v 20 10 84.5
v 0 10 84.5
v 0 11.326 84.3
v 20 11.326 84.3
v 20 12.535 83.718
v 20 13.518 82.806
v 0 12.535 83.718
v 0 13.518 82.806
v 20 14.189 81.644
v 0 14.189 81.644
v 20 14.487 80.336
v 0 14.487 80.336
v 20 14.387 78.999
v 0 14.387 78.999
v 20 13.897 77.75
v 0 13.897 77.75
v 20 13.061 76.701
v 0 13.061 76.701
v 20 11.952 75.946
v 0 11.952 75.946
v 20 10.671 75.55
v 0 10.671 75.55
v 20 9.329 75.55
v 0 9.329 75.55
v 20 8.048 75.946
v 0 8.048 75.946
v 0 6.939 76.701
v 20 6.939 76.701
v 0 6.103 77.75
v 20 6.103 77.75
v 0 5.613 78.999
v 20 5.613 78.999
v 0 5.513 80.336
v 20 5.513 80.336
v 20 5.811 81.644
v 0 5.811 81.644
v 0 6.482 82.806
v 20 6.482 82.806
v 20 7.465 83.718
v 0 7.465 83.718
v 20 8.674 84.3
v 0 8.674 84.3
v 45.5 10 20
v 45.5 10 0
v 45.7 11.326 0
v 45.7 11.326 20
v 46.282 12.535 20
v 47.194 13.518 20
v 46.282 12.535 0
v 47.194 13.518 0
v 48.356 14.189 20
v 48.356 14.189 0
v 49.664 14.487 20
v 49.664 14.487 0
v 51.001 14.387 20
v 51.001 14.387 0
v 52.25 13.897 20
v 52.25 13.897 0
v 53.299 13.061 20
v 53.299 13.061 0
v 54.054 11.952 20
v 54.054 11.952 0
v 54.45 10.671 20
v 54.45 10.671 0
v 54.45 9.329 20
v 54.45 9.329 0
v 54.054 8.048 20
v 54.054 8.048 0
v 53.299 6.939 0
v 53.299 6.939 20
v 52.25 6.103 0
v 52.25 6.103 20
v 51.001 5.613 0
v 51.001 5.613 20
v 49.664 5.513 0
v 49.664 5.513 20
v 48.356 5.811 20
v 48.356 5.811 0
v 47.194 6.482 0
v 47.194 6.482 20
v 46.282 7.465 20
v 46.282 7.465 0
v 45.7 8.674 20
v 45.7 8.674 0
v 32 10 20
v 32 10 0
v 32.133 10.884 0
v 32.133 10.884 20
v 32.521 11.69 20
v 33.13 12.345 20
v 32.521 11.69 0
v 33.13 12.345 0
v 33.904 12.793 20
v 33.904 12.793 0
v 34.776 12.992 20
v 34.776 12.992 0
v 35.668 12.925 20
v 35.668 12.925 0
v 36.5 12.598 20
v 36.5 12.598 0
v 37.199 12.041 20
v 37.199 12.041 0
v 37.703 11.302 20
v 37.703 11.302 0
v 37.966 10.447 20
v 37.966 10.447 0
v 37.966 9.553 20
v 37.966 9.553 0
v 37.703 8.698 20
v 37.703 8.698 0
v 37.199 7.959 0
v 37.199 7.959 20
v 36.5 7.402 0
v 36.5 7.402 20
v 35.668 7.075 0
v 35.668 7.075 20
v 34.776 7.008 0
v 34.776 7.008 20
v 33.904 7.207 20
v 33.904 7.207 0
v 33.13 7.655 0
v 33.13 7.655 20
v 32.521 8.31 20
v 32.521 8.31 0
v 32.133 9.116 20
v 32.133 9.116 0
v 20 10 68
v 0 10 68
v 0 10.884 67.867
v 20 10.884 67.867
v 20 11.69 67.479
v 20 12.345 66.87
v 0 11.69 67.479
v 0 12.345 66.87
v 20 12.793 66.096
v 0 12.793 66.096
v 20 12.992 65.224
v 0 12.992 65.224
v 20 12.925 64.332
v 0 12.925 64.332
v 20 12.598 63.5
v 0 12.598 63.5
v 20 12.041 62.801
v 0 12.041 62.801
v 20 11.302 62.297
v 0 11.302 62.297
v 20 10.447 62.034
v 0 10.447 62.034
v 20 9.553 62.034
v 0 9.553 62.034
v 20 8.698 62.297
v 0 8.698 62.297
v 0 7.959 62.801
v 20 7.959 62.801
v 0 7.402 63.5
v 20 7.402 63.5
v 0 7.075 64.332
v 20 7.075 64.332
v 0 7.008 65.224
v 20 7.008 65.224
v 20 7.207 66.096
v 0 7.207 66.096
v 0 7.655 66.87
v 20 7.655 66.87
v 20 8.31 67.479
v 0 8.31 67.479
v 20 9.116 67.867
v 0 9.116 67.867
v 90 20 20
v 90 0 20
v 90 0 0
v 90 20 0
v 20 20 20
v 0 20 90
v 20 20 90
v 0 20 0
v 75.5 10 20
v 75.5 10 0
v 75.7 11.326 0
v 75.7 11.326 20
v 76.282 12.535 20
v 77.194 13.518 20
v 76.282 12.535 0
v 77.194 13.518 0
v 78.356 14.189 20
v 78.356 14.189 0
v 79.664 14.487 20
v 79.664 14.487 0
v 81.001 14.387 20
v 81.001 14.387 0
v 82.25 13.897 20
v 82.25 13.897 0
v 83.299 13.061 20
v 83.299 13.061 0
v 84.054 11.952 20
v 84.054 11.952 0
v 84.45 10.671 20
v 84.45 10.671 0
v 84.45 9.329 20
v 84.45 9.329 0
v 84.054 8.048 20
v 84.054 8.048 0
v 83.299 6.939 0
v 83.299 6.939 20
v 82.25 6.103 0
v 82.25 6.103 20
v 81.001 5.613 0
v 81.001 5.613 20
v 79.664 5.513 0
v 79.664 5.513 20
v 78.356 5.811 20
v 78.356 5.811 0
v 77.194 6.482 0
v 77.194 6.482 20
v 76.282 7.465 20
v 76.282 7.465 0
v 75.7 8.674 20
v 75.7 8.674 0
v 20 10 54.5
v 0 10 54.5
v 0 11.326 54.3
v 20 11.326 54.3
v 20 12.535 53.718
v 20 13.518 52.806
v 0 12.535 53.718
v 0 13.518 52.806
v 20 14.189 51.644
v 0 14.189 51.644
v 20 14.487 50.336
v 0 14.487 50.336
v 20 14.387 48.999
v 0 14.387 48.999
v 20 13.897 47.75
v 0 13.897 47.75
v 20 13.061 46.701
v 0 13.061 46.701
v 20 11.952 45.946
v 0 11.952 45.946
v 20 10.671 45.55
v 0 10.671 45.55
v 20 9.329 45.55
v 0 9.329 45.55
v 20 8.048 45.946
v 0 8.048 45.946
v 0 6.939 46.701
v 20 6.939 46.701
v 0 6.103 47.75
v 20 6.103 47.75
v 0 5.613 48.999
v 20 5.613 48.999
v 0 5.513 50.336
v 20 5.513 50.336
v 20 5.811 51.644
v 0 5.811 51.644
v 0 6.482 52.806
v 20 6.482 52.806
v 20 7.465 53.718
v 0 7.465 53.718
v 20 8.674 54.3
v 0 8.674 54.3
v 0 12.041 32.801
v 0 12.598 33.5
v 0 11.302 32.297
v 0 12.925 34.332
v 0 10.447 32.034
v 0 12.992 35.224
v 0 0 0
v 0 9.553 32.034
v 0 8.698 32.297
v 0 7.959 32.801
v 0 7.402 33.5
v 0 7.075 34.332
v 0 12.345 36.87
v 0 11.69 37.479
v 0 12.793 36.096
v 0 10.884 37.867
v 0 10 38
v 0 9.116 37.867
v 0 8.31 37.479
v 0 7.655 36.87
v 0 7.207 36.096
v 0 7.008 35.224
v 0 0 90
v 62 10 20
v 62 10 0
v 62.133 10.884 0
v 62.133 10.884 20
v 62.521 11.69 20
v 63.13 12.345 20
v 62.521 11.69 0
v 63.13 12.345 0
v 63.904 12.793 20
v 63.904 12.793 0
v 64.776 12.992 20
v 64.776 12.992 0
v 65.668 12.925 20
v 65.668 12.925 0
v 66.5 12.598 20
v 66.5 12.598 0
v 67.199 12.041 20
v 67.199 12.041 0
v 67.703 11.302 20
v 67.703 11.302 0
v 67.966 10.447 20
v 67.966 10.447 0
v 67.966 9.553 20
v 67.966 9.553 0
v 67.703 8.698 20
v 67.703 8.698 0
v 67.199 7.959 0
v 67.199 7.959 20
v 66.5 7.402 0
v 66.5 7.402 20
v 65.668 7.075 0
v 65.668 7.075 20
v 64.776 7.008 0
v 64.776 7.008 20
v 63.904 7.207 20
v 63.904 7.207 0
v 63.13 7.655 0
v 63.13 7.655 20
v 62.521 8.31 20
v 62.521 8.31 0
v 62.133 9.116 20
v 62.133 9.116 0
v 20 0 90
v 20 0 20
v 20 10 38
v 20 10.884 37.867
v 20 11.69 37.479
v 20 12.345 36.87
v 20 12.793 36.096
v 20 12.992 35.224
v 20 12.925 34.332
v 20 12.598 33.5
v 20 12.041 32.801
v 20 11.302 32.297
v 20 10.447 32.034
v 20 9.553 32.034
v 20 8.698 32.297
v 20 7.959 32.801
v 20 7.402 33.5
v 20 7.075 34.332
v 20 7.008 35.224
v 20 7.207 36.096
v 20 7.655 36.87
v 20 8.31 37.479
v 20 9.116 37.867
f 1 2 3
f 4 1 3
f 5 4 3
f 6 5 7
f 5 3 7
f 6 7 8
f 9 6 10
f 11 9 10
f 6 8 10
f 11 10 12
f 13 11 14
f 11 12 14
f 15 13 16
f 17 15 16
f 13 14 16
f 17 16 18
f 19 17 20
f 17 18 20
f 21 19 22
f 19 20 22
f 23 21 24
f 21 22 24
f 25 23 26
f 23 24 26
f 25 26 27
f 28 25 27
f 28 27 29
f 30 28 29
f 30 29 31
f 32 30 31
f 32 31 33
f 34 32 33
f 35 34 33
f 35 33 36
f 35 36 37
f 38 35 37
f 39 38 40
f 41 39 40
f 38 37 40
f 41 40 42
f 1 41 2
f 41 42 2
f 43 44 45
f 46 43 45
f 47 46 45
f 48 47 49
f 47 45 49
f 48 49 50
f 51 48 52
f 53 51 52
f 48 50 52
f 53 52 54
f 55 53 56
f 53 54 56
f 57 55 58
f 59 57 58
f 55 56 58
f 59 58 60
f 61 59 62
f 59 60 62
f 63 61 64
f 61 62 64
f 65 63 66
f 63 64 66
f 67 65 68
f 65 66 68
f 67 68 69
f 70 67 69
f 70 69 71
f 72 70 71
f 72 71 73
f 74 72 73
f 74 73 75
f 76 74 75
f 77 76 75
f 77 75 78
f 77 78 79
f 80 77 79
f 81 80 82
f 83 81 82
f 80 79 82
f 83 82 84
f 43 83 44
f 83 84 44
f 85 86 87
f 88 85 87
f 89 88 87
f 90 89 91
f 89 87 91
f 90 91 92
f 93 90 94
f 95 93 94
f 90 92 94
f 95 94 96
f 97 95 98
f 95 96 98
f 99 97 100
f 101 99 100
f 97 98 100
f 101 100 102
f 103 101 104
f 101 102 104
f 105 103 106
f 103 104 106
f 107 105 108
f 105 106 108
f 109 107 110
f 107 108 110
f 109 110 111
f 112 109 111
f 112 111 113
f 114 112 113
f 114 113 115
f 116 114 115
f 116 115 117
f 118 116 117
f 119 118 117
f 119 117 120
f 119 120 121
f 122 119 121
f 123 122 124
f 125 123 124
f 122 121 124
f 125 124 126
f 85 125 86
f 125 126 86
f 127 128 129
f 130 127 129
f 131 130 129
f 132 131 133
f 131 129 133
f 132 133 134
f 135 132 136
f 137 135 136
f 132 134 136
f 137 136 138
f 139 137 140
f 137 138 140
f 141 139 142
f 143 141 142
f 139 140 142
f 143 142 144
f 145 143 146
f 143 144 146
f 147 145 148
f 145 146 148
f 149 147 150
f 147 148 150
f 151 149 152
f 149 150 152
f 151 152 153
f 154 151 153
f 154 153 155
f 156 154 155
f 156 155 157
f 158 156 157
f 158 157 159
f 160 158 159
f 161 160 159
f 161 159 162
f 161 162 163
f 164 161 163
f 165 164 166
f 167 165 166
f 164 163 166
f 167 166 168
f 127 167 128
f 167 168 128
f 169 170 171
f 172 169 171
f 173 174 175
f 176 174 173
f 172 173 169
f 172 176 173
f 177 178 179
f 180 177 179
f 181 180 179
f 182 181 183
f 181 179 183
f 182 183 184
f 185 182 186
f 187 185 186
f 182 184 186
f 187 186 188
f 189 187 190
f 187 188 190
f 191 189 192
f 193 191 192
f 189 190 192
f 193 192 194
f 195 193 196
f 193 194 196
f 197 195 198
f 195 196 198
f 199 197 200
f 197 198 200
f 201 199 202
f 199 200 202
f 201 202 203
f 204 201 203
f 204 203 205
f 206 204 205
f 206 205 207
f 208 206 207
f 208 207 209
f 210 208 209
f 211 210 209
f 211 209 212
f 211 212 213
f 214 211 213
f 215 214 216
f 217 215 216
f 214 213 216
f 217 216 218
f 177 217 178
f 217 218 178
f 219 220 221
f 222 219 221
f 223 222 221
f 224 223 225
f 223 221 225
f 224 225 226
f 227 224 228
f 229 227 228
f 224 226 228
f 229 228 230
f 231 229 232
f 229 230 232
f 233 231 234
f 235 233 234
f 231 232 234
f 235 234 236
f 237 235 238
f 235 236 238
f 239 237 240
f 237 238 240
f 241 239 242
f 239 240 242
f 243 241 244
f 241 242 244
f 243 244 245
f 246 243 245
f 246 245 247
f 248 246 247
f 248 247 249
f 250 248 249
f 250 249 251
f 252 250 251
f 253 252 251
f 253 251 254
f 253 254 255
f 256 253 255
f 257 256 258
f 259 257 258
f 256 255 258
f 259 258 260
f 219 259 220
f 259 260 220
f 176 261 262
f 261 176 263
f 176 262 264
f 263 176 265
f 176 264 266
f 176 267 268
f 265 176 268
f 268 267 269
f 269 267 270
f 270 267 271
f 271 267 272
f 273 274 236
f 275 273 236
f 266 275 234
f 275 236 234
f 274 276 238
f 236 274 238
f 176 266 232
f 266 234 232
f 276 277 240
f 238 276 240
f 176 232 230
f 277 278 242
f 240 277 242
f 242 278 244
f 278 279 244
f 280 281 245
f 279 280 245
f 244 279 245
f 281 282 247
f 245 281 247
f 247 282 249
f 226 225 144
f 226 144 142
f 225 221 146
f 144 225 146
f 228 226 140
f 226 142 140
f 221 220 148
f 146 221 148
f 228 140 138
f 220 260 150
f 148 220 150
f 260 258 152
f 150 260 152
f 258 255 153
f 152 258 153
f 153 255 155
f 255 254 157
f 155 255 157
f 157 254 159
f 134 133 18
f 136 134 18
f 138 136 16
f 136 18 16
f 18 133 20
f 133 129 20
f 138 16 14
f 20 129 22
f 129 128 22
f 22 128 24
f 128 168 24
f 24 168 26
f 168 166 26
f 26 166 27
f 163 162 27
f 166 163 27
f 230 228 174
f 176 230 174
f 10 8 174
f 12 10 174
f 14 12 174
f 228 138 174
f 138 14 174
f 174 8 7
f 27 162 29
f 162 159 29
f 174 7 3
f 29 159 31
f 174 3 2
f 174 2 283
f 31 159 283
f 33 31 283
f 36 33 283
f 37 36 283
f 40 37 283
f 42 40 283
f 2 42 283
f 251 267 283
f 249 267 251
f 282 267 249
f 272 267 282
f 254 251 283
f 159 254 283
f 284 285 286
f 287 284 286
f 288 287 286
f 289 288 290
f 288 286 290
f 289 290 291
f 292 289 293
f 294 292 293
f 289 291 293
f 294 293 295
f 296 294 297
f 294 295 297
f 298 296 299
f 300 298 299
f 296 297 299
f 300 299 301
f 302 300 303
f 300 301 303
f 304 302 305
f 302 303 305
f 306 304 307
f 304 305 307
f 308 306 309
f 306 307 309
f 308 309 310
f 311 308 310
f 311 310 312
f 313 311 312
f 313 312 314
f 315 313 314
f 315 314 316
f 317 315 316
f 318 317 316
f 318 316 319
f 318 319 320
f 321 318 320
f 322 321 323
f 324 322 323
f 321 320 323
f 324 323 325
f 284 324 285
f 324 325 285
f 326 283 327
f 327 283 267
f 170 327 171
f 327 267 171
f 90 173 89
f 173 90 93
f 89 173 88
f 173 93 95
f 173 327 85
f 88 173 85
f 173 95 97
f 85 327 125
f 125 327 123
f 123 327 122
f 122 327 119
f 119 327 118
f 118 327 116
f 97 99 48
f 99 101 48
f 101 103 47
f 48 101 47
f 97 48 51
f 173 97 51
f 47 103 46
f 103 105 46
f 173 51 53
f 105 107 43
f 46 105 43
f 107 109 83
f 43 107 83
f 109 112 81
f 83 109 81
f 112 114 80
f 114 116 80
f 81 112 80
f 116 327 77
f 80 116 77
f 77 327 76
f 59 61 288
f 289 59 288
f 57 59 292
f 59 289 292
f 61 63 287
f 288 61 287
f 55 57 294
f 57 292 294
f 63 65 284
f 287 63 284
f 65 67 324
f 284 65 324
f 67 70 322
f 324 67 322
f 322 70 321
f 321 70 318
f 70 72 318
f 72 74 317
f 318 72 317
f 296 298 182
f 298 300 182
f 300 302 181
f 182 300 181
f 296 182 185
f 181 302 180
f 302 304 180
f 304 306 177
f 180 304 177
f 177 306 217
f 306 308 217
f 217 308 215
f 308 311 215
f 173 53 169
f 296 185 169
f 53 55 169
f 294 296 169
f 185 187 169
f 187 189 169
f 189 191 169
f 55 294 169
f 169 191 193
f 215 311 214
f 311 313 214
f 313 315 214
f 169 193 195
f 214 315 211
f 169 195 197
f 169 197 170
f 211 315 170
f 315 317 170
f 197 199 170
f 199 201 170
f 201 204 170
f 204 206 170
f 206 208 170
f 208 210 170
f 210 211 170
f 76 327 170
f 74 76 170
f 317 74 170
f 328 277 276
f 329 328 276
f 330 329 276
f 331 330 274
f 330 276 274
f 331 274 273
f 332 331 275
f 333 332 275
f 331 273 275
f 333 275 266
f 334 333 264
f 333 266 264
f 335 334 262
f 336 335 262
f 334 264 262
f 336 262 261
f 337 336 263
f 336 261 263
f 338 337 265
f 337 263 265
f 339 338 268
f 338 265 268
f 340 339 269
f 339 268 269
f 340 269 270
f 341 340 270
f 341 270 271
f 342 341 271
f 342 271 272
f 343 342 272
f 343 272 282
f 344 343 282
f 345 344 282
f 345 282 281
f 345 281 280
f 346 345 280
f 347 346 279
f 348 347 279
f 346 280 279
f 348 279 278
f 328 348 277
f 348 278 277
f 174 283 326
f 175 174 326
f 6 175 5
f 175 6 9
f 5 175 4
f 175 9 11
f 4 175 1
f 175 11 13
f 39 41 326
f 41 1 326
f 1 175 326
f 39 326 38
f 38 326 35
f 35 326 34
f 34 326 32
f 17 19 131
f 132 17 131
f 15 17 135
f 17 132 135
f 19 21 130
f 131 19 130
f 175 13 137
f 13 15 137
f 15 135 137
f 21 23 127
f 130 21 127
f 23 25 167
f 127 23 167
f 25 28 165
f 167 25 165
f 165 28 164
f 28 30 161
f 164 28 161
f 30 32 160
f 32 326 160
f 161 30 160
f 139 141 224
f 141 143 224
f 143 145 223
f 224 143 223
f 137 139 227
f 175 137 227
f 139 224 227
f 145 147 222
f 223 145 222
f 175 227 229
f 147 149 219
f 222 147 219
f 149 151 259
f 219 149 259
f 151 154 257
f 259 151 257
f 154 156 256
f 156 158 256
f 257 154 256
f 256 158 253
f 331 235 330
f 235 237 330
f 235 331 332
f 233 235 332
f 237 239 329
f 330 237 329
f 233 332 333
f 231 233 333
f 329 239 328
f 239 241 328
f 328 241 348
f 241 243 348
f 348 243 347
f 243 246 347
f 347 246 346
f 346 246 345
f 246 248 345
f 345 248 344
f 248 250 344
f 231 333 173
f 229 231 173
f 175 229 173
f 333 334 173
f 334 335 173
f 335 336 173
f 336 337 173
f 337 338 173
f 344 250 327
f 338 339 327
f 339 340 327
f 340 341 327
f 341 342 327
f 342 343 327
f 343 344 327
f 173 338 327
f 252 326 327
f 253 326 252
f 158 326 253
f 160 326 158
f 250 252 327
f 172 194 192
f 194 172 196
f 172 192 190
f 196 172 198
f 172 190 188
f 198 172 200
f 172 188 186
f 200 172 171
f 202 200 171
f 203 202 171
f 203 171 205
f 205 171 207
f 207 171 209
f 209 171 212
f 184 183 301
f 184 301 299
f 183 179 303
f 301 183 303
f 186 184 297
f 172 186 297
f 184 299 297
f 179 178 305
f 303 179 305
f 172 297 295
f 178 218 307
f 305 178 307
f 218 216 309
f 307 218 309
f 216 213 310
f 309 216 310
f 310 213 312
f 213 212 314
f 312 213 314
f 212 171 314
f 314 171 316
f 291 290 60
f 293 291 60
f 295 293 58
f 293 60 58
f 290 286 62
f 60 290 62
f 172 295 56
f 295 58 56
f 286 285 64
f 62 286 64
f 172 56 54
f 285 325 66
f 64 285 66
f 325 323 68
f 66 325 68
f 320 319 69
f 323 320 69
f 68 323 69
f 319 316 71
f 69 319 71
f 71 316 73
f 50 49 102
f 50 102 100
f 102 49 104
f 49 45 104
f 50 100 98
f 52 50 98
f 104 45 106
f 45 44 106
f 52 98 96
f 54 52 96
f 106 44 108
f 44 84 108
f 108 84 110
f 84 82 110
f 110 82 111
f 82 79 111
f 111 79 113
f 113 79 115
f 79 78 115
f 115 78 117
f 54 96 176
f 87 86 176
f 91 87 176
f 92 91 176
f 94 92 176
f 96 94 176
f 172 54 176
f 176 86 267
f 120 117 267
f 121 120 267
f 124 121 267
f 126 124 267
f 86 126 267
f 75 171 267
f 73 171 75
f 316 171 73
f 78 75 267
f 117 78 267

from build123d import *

# Parameters (mm, degrees)
EXTRUDE_1_DEPTH     = 20
SKETCH_2_R          = 3
SKETCH_2_R_2        = 4.5
CUT_EXTRUDE_1_DEPTH = 20
SKETCH_3_R          = 3
SKETCH_3_R_2        = 4.5
CUT_EXTRUDE_2_DEPTH = 20


with BuildPart() as part:
    # 草图1 → 凸台-拉伸1 (new body)
    with BuildSketch(Plane(origin=(0, 0, 0), x_dir=(1, 0, 0), z_dir=(0, 1, 0))):
        Polygon((0, 0), (0, -90), (20, -90), (20, -20), (90, -20), (90, 0), align=None)
    extrude(amount=EXTRUDE_1_DEPTH)

    # 草图2 → 切除-拉伸1 (cut)
    with BuildSketch(Plane.ZY):
        with Locations((35, 10)):
            Circle(SKETCH_2_R)
        with Locations((50, 10)):
            Circle(SKETCH_2_R_2)
        with Locations((65, 10)):
            Circle(SKETCH_2_R)
        with Locations((80, 10)):
            Circle(SKETCH_2_R_2)
    extrude(amount=-CUT_EXTRUDE_1_DEPTH, mode=Mode.SUBTRACT)

    # 草图3 → 切除-拉伸2 (cut)
    with BuildSketch(Plane(origin=(0, 0, 0), x_dir=(-1, 0, 0), z_dir=(0, 0, -1))):
        with Locations((-35, 10)):
            Circle(SKETCH_3_R)
        with Locations((-50, 10)):
            Circle(SKETCH_3_R_2)
        with Locations((-65, 10)):
            Circle(SKETCH_3_R)
        with Locations((-80, 10)):
            Circle(SKETCH_3_R_2)
    extrude(amount=-CUT_EXTRUDE_2_DEPTH, mode=Mode.SUBTRACT)


solid = part.part
